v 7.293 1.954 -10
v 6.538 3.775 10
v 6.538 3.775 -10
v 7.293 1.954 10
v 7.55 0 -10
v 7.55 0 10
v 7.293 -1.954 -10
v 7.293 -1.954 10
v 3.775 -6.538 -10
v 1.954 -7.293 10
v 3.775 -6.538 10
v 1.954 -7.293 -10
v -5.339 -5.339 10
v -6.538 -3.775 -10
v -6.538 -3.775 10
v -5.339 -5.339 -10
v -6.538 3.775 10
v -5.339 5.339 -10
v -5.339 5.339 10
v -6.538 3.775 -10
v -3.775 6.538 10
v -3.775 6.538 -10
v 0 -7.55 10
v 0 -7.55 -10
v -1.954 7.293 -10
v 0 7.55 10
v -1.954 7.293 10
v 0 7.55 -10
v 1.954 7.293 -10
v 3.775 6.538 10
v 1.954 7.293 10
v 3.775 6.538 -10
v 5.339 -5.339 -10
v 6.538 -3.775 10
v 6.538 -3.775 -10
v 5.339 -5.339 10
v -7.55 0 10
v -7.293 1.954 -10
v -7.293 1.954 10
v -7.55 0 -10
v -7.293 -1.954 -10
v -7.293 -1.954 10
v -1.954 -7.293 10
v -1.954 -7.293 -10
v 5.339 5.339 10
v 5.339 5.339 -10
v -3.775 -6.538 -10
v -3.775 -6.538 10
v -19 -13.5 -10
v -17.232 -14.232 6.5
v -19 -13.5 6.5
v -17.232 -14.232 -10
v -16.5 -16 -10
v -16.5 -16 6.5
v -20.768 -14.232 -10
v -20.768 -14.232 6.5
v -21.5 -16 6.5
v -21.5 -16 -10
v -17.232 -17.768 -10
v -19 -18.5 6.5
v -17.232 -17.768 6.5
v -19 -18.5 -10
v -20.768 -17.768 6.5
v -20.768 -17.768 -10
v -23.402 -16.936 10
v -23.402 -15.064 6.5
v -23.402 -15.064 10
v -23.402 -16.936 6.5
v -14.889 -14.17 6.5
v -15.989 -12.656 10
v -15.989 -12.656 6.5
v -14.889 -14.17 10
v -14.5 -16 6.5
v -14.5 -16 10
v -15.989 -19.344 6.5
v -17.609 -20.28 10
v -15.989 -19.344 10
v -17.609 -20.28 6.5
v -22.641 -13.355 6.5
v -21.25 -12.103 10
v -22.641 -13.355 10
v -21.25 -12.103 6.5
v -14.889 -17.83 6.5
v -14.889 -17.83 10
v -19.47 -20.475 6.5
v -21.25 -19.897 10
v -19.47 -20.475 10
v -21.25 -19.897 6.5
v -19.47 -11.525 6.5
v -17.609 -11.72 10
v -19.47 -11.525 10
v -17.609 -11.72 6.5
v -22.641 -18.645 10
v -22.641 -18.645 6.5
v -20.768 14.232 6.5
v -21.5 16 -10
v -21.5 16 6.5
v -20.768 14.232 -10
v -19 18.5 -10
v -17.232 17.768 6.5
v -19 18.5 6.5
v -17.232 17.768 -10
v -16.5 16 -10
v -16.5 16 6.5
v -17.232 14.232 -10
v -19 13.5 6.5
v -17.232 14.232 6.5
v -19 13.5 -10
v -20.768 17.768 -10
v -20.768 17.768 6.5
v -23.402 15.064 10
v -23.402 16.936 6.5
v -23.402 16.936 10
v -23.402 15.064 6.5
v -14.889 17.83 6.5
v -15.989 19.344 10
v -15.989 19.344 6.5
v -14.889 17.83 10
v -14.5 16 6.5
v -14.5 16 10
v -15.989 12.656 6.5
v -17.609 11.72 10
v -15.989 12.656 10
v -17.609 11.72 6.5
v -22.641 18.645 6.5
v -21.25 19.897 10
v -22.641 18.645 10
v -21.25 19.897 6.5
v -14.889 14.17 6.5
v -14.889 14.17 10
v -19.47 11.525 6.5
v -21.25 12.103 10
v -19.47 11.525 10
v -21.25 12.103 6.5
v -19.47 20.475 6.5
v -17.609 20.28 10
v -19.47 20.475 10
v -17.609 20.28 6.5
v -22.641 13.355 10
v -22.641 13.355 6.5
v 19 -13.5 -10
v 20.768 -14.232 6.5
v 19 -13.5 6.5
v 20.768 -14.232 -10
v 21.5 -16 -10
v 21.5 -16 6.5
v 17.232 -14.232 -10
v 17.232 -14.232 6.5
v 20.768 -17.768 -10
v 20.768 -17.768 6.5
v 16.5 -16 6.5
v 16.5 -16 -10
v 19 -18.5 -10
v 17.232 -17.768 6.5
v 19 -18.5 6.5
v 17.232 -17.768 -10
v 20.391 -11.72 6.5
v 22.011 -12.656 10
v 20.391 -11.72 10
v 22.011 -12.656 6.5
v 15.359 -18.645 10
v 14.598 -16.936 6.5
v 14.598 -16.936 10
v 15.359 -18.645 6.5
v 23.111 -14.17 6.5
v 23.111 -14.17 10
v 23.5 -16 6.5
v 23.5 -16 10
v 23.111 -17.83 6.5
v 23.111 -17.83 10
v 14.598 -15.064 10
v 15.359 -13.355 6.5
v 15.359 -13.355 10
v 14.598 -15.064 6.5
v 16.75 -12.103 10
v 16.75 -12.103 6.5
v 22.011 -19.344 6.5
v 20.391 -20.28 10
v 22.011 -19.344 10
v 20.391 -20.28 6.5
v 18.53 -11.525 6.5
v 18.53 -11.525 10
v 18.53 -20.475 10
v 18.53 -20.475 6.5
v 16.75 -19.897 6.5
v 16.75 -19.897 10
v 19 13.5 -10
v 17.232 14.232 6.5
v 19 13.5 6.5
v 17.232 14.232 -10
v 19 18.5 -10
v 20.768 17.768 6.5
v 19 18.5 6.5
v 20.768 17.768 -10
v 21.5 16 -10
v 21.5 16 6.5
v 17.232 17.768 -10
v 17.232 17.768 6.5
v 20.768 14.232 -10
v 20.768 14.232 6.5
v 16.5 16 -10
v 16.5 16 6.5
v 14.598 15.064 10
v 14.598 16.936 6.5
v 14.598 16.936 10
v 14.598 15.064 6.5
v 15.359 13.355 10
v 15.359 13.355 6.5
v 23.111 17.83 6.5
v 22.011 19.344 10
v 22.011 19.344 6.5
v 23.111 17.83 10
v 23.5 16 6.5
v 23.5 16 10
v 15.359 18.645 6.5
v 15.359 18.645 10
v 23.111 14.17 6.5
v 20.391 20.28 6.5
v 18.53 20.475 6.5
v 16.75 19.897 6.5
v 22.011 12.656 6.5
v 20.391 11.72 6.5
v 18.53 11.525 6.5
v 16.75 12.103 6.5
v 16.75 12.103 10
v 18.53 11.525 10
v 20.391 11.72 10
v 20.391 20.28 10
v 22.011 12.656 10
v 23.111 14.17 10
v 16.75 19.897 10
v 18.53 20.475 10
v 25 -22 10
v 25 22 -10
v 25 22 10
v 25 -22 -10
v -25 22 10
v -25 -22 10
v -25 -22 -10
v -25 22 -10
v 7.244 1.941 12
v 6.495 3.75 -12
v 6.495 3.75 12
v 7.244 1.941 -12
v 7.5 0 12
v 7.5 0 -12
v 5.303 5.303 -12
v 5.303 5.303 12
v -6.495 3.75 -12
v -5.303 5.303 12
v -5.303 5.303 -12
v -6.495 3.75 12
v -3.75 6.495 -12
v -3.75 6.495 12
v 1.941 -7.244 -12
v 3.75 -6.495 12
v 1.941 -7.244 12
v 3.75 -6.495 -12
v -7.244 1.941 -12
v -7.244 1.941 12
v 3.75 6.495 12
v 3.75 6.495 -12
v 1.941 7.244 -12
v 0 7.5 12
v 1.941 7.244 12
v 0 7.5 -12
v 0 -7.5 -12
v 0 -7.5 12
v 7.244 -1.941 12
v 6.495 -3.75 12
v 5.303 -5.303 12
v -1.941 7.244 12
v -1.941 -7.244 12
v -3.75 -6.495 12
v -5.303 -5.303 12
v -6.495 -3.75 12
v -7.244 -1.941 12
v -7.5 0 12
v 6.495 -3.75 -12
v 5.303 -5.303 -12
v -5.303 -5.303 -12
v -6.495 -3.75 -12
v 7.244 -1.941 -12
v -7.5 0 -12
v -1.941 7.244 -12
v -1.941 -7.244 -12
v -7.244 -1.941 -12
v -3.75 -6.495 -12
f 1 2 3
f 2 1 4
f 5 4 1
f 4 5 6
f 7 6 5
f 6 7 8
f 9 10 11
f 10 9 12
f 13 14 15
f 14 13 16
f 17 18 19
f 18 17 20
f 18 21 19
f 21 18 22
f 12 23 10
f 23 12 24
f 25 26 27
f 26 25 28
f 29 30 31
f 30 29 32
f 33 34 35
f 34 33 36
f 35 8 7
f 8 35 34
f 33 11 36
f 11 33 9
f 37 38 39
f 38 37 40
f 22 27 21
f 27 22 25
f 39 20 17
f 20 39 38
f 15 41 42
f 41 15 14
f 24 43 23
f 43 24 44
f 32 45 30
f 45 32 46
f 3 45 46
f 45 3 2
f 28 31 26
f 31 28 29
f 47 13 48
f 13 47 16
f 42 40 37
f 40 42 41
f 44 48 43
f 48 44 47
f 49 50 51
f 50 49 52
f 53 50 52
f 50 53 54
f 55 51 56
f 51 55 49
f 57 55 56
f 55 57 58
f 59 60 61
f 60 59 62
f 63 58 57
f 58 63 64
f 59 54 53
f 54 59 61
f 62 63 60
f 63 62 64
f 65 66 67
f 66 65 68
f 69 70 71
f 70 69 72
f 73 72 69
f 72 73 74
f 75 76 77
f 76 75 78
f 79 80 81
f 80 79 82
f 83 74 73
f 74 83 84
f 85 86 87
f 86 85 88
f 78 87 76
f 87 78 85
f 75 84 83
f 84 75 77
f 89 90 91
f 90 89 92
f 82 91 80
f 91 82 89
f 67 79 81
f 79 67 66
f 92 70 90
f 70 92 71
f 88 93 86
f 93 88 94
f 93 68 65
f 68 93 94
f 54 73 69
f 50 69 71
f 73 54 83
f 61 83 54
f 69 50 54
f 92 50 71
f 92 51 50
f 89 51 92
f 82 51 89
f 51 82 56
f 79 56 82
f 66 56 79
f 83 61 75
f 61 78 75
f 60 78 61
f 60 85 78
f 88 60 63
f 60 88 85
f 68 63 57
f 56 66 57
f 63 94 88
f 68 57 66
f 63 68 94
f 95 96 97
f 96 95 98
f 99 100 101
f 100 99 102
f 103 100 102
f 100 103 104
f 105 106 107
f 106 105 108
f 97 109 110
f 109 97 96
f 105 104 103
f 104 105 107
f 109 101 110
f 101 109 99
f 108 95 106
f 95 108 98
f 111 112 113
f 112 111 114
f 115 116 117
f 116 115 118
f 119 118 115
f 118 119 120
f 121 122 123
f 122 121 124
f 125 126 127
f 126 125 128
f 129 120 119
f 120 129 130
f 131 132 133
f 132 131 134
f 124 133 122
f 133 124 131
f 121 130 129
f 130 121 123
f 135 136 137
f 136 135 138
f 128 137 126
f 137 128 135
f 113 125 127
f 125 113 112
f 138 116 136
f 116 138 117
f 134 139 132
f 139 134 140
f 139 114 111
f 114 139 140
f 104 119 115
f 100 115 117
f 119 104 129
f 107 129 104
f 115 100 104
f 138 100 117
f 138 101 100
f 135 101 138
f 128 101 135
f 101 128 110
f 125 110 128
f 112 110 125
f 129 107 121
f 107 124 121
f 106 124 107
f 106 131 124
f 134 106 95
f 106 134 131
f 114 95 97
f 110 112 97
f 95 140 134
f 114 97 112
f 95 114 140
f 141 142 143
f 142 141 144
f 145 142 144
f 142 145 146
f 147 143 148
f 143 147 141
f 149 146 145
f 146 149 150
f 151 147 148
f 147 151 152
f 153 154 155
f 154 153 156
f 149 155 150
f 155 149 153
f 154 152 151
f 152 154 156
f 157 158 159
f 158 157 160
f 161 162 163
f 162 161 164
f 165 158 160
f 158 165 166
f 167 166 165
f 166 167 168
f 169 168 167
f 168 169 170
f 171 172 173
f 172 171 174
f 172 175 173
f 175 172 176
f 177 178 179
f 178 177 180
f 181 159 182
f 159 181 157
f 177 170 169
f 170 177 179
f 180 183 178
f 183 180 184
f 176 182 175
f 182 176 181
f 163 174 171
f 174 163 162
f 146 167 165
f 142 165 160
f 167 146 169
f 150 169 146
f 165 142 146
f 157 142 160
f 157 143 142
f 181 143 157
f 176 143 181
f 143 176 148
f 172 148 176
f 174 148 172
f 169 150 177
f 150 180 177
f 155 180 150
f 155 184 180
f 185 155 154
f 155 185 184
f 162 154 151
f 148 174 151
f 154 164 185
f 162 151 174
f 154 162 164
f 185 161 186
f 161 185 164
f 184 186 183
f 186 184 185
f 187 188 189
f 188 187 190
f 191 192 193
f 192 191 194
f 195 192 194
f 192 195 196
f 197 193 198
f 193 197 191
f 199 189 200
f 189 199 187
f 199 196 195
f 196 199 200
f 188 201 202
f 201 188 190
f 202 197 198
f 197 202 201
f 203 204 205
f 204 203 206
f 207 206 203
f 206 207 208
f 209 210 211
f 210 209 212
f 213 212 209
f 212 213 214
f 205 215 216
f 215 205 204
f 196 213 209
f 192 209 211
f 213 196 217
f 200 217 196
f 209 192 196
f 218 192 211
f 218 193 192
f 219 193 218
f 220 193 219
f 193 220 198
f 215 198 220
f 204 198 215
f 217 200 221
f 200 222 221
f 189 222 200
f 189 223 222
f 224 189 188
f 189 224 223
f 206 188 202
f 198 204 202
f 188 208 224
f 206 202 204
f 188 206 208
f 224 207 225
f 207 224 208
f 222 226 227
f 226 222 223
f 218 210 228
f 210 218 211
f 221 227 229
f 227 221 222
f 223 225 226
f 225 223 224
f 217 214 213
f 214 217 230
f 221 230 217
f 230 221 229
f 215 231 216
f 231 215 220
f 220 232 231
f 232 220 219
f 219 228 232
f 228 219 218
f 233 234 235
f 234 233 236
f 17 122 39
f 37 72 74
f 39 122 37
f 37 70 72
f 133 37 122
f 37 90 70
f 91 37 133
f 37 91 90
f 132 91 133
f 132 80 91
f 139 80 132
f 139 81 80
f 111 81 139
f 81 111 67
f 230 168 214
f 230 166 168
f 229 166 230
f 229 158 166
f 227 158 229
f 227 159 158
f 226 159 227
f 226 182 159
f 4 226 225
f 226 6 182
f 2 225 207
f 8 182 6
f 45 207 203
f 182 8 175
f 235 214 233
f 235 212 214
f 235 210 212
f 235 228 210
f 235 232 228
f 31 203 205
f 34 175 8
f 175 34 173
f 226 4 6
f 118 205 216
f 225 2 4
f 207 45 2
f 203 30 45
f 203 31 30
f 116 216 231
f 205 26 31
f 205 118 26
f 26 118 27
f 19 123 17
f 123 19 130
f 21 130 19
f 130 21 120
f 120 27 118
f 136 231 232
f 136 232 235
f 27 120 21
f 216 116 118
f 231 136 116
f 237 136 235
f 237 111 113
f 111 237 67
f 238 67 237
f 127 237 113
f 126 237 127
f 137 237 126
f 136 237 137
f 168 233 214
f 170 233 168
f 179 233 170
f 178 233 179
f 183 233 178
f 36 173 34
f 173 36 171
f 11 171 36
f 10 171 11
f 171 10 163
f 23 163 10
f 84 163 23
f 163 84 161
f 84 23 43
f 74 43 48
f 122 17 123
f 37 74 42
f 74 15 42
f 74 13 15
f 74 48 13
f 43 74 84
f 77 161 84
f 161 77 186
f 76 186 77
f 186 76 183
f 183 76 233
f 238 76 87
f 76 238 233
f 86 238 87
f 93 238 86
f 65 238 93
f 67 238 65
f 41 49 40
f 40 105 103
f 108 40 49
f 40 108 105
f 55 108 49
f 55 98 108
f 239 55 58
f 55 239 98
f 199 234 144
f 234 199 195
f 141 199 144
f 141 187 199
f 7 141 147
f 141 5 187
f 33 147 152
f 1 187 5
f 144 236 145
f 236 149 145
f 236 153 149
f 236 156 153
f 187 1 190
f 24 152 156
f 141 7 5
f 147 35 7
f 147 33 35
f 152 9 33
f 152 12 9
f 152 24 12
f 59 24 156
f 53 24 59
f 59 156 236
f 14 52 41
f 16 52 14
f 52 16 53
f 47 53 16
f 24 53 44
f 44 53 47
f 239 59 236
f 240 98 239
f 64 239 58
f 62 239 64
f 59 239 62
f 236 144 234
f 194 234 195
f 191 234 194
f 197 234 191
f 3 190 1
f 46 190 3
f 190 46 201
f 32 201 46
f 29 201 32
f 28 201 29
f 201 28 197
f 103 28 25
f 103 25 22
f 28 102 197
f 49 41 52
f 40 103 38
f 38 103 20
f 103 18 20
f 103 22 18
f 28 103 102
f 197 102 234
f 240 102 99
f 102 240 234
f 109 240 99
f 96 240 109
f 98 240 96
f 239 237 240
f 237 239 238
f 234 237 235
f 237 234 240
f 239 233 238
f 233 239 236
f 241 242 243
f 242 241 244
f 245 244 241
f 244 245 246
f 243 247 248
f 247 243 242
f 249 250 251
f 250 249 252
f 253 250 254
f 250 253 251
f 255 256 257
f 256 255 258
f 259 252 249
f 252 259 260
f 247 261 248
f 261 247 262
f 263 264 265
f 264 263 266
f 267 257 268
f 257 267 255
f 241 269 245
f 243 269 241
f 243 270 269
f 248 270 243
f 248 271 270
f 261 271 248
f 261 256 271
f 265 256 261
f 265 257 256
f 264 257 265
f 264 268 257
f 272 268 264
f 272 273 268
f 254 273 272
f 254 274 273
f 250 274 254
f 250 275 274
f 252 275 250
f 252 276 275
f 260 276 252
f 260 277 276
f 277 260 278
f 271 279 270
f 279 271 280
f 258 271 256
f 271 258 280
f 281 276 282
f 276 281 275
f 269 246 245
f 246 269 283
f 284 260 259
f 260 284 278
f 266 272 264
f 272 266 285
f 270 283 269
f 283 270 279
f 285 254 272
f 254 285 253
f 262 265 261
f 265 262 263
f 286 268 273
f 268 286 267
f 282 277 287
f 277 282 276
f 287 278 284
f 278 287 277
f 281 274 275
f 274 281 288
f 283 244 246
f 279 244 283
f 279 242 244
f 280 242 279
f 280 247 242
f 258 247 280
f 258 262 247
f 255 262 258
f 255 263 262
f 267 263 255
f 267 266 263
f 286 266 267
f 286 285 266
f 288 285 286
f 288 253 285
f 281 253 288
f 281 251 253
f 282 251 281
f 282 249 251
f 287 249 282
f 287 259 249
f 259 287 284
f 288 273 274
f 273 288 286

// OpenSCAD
// Parameters
shaft_diameter_mm = 9.0; //[4.5:18.0:0.1]
shaft_clearance_mm = 0.2; //[0.0:1.0:0.05]
shaft_bore_diameter_mm = 9.2; //[4.6:19.0:0.1]
block_length_mm = 50.0; //[25.0:100.0:1]
block_width_mm = 44.0; //[22.0:88.0:1]
block_height_mm = 20.0; //[10.0:40.0:1]
mount_hole_count = 4; //[2:8:1]
mount_hole_diameter_mm = 5.0; //[2.5:10.0:0.1]
mount_hole_edge_margin_mm = 6.0; //[3.0:12.0:0.5]
mount_hole_spacing_x_mm = 38.0; //[19.0:76.0:1]
mount_hole_spacing_y_mm = 32.0; //[16.0:64.0:1]
insert_outer_diameter_mm = 15.0; //[7.5:30.0:0.1]
insert_length_mm = 24.0; //[12.0:48.0:1]
insert_fit_clearance_mm = 0.1; //[0.0:0.5:0.05]
retention_lip_thickness_mm = 1.5; //[0.5:3.0:0.1]
retention_lip_radial_mm = 1.0; //[0.5:3.0:0.1]
counterbore_diameter_mm = 9.0; //[6.0:16.0:0.1]
counterbore_depth_mm = 3.0; //[1.0:8.0:0.5]
overlap_mm = 1.0; //[0.5:2.0:0.1]

// SCS Bearing Block
module scs_bearing_block() {
  color("Silver") {
    difference() {
      // Main block
      translate([0, 0, 0])
        cube([block_length_mm, block_width_mm, block_height_mm], center=true);
      // Shaft bore
      translate([0, 0, 0])
        cylinder(h=block_height_mm + 2*overlap_mm, r=shaft_bore_diameter_mm/2, center=true);
      // Insert pocket with retention lip
      difference() {
        translate([0, 0, 0])
          cylinder(h=insert_length_mm + 2*overlap_mm, r=(insert_outer_diameter_mm + insert_fit_clearance_mm)/2, center=true);
        translate([0, 0, block_height_mm/2 - retention_lip_thickness_mm/2])
          cylinder(h=retention_lip_thickness_mm + overlap_mm, r=((insert_outer_diameter_mm + insert_fit_clearance_mm) - 2*retention_lip_radial_mm)/2, center=true);
      }
      // Mounting holes
      scs_bearing_block_hole_positions();
    }
  }
}

// Linear Bearing
module linear_bearing() {
  color("Black") {
    translate([0, 0, 0])
      cylinder(h=insert_length_mm, r=insert_outer_diameter_mm/2, center=true);
  }
}

// SBR Bearing Block
module sbr_bearing_block() {
  color("DimGray") {
    difference() {
      // Main block
      translate([0, 0, 0])
        cube([block_length_mm, block_width_mm, block_height_mm], center=true);
      // Shaft bore
      translate([0, 0, 0])
        cylinder(h=block_height_mm + 2*overlap_mm, r=shaft_bore_diameter_mm/2, center=true);
      // Insert pocket with retention lip
      difference() {
        translate([0, 0, 0])
          cylinder(h=insert_length_mm + 2*overlap_mm, r=(insert_outer_diameter_mm + insert_fit_clearance_mm)/2, center=true);
        translate([0, 0, block_height_mm/2 - retention_lip_thickness_mm/2])
          cylinder(h=retention_lip_thickness_mm + overlap_mm, r=((insert_outer_diameter_mm + insert_fit_clearance_mm) - 2*retention_lip_radial_mm)/2, center=true);
      }
      // Mounting holes
      sbr_bearing_block_hole_positions();
    }
  }
}

// SCS Bearing Block Assembly
module scs_bearing_block_assembly() {
  scs_bearing_block();
  translate([0, 0, 0])
    linear_bearing();
}

// SCS Bearing Block Hole Positions
module scs_bearing_block_hole_positions() {
  color("Silver") {
    for (x = [-1, 1])
      for (y = [-1, 1]) {
        translate([x * mount_hole_spacing_x_mm/2, y * mount_hole_spacing_y_mm/2, 0])
          cylinder(h=block_height_mm + 2*overlap_mm, r=mount_hole_diameter_mm/2, center=true);
        translate([x * mount_hole_spacing_x_mm/2, y * mount_hole_spacing_y_mm/2, block_height_mm/2 - counterbore_depth_mm/2])
          cylinder(h=counterbore_depth_mm + overlap_mm, r=counterbore_diameter_mm/2, center=true);
      }
  }
}

// SBR Bearing Block Hole Positions
module sbr_bearing_block_hole_positions() {
  color("Silver") {
    for (x = [-1, 1])
      for (y = [-1, 1]) {
        translate([x * mount_hole_spacing_x_mm/2, y * mount_hole_spacing_y_mm/2, 0])
          cylinder(h=block_height_mm + 2*overlap_mm, r=mount_hole_diameter_mm/2, center=true);
        translate([x * mount_hole_spacing_x_mm/2, y * mount_hole_spacing_y_mm/2, block_height_mm/2 - counterbore_depth_mm/2])
          cylinder(h=counterbore_depth_mm + overlap_mm, r=counterbore_diameter_mm/2, center=true);
      }
  }
}

// Assembly
module assembly() {
  scs_bearing_block_assembly();
}

assembly();
